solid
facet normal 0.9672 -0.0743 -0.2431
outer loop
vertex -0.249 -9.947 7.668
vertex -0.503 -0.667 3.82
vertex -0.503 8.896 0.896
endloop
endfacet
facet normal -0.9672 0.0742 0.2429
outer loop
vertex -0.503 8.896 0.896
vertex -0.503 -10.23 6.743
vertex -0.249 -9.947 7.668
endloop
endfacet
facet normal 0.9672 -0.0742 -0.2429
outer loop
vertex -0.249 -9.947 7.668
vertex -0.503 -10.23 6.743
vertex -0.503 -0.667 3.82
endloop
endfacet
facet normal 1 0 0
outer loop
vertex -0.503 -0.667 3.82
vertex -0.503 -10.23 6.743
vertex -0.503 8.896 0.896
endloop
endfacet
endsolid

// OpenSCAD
hull()
  polyhedron(points = [
[-0.249434174697078959, -9.946811825017595865, 7.668480694904857842],
[-0.503165223042536525, 8.8964795095546467252, 0.896037100784631946],
[-0.503165223042536525, -0.66656805007570774091, 3.819754148011998751],
[-0.503165223042536525, -10.229615609706060653, 6.743471195239365557]],
faces = [[0,1,2,3]]);
